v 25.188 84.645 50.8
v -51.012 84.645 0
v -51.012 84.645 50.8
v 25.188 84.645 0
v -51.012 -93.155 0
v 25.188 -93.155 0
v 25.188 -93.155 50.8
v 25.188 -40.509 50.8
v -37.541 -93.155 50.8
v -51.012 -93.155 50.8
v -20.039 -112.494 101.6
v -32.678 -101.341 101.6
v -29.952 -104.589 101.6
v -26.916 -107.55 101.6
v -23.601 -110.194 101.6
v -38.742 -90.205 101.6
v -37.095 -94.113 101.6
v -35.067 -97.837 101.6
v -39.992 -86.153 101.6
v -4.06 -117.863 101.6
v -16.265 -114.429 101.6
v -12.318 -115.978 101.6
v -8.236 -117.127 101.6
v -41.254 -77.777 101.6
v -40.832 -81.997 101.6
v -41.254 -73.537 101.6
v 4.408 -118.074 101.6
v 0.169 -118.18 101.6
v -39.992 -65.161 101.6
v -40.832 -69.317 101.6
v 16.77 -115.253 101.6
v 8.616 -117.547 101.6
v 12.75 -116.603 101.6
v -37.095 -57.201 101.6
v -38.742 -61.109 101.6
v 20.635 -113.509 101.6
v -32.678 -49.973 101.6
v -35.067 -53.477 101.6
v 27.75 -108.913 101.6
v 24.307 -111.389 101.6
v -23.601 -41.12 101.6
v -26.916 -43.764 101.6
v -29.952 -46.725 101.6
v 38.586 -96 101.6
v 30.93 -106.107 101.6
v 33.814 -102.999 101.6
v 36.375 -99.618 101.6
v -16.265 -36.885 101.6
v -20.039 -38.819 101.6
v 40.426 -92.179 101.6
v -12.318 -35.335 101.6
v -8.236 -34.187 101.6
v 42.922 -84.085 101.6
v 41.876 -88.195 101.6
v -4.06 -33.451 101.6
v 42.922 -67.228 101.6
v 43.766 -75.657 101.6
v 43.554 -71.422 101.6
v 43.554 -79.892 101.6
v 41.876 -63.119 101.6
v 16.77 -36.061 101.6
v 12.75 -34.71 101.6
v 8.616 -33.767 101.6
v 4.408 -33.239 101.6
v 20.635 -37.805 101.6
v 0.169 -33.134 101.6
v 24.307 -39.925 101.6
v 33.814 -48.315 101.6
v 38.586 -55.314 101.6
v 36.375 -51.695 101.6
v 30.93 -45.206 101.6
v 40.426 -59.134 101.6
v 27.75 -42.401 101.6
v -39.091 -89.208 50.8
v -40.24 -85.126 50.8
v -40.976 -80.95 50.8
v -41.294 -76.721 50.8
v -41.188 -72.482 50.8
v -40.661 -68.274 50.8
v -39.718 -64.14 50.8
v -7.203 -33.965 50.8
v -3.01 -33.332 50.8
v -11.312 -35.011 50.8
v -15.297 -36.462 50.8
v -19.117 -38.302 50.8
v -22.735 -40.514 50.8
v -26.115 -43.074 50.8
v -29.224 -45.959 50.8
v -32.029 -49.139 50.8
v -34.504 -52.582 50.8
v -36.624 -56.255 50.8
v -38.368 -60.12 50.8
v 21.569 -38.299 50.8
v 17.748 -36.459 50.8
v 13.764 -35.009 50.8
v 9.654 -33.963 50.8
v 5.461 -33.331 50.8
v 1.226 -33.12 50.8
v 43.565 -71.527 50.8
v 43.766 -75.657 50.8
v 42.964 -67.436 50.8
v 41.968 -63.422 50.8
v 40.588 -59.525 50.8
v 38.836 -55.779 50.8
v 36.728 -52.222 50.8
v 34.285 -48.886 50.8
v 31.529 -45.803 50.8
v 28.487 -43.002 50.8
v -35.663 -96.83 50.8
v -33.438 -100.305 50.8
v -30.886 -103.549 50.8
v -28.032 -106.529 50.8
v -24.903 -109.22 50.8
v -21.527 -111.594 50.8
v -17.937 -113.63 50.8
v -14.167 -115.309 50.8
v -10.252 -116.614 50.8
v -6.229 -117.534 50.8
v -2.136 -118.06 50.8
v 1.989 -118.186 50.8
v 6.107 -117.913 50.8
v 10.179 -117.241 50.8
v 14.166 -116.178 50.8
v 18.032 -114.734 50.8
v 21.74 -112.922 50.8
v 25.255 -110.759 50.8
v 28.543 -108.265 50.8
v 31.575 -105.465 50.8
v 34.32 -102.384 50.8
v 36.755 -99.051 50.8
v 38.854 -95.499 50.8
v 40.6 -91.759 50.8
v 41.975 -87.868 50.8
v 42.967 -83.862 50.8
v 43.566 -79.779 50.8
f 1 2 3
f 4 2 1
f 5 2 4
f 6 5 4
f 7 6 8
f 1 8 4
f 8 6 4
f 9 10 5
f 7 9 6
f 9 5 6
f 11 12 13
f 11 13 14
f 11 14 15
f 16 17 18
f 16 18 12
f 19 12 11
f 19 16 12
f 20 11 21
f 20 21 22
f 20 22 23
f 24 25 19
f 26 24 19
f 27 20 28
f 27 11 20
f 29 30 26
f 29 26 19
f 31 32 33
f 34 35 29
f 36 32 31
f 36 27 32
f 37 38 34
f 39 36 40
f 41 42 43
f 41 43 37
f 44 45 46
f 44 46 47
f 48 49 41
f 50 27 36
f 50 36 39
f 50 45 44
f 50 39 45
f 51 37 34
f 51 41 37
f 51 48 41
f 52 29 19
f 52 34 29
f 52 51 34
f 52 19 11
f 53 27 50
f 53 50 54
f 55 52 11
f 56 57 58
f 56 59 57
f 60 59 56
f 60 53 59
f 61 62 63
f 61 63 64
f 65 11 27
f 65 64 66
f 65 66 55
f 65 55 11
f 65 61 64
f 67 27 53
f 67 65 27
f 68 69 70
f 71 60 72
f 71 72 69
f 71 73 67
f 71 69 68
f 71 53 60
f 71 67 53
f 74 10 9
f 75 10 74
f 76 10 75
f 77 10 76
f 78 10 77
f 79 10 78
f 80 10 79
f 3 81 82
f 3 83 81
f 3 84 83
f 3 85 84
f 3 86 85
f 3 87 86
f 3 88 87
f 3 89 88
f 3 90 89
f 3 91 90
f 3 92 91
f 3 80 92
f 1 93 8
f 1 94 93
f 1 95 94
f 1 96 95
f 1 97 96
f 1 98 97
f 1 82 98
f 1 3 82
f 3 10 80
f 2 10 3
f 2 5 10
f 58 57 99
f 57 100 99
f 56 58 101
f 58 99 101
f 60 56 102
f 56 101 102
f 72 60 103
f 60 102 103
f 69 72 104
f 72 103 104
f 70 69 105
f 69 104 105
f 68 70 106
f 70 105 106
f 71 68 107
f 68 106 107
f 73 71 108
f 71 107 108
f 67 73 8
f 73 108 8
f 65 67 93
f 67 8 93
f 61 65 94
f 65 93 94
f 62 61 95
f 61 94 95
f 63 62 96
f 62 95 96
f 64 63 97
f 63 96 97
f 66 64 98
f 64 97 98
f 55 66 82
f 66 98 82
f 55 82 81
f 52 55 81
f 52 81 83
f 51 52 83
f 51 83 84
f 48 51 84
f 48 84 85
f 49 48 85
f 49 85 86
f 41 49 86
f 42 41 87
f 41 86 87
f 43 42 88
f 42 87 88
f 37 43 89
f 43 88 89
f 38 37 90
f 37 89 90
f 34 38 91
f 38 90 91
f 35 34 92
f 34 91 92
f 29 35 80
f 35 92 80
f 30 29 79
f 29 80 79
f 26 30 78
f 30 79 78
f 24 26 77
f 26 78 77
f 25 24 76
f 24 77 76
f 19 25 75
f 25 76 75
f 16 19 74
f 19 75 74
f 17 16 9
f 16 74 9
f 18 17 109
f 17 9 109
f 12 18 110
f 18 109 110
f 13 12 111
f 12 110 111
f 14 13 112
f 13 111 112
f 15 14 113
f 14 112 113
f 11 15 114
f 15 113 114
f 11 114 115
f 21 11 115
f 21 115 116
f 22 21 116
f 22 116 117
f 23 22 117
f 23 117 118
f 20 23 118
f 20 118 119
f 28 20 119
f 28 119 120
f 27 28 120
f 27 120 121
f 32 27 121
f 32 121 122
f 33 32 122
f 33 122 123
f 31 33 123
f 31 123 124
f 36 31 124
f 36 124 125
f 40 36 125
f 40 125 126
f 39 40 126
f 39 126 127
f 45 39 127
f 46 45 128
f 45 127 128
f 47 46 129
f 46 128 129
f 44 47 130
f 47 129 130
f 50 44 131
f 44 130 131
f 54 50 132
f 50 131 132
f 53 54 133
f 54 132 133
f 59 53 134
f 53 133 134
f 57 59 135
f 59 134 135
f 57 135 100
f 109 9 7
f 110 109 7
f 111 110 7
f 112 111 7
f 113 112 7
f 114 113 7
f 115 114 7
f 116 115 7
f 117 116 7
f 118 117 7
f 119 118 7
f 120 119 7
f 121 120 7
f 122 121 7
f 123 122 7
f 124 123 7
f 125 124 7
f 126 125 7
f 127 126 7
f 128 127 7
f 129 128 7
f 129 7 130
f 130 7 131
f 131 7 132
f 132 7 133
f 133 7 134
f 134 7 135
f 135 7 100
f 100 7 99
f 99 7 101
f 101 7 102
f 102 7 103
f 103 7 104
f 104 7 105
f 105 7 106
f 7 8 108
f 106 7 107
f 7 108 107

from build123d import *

# Parameters (mm, degrees)
F0_W      = 76.2
F0_H      = 177.8
F1_DEPTH  = 25.4
F1_FACE_W = 76.2
F1_FACE_H = 177.8
F2_DEPTH  = 25.4
F4_R      = 42.536427
F5_DEPTH  = 25.4
F5_FACE_R = 42.536427
F6_DEPTH  = 25.4


with BuildPart() as f1:
    # F0 (on Top) → F1 (new body)
    with BuildSketch(Plane.XY):
        with Locations((-12.912218, -4.254788)):
            Rectangle(F0_W, F0_H)
    extrude(amount=F1_DEPTH)

    # F1_face (on face) → F2 (join)
    with BuildSketch(Plane(origin=(-12.912218, -4.254788, 25.4), x_dir=(1, 0, 0), z_dir=(0, 0, 1))):
        Rectangle(F1_FACE_W, F1_FACE_H)
    extrude(amount=F2_DEPTH)

    # F4 (on face) → F5 (join)
    with BuildSketch(Plane.XY.offset(50.8)):
        with Locations((1.229391, -75.656846)):
            Circle(F4_R)
    extrude(amount=F5_DEPTH)

    # F5_face (on face) → F6 (join)
    with BuildSketch(Plane(origin=(1.229391, -75.656846, 76.2), x_dir=(1, 0, 0), z_dir=(0, 0, 1))):
        Circle(F5_FACE_R)
    extrude(amount=F6_DEPTH)


solid = f1.part
